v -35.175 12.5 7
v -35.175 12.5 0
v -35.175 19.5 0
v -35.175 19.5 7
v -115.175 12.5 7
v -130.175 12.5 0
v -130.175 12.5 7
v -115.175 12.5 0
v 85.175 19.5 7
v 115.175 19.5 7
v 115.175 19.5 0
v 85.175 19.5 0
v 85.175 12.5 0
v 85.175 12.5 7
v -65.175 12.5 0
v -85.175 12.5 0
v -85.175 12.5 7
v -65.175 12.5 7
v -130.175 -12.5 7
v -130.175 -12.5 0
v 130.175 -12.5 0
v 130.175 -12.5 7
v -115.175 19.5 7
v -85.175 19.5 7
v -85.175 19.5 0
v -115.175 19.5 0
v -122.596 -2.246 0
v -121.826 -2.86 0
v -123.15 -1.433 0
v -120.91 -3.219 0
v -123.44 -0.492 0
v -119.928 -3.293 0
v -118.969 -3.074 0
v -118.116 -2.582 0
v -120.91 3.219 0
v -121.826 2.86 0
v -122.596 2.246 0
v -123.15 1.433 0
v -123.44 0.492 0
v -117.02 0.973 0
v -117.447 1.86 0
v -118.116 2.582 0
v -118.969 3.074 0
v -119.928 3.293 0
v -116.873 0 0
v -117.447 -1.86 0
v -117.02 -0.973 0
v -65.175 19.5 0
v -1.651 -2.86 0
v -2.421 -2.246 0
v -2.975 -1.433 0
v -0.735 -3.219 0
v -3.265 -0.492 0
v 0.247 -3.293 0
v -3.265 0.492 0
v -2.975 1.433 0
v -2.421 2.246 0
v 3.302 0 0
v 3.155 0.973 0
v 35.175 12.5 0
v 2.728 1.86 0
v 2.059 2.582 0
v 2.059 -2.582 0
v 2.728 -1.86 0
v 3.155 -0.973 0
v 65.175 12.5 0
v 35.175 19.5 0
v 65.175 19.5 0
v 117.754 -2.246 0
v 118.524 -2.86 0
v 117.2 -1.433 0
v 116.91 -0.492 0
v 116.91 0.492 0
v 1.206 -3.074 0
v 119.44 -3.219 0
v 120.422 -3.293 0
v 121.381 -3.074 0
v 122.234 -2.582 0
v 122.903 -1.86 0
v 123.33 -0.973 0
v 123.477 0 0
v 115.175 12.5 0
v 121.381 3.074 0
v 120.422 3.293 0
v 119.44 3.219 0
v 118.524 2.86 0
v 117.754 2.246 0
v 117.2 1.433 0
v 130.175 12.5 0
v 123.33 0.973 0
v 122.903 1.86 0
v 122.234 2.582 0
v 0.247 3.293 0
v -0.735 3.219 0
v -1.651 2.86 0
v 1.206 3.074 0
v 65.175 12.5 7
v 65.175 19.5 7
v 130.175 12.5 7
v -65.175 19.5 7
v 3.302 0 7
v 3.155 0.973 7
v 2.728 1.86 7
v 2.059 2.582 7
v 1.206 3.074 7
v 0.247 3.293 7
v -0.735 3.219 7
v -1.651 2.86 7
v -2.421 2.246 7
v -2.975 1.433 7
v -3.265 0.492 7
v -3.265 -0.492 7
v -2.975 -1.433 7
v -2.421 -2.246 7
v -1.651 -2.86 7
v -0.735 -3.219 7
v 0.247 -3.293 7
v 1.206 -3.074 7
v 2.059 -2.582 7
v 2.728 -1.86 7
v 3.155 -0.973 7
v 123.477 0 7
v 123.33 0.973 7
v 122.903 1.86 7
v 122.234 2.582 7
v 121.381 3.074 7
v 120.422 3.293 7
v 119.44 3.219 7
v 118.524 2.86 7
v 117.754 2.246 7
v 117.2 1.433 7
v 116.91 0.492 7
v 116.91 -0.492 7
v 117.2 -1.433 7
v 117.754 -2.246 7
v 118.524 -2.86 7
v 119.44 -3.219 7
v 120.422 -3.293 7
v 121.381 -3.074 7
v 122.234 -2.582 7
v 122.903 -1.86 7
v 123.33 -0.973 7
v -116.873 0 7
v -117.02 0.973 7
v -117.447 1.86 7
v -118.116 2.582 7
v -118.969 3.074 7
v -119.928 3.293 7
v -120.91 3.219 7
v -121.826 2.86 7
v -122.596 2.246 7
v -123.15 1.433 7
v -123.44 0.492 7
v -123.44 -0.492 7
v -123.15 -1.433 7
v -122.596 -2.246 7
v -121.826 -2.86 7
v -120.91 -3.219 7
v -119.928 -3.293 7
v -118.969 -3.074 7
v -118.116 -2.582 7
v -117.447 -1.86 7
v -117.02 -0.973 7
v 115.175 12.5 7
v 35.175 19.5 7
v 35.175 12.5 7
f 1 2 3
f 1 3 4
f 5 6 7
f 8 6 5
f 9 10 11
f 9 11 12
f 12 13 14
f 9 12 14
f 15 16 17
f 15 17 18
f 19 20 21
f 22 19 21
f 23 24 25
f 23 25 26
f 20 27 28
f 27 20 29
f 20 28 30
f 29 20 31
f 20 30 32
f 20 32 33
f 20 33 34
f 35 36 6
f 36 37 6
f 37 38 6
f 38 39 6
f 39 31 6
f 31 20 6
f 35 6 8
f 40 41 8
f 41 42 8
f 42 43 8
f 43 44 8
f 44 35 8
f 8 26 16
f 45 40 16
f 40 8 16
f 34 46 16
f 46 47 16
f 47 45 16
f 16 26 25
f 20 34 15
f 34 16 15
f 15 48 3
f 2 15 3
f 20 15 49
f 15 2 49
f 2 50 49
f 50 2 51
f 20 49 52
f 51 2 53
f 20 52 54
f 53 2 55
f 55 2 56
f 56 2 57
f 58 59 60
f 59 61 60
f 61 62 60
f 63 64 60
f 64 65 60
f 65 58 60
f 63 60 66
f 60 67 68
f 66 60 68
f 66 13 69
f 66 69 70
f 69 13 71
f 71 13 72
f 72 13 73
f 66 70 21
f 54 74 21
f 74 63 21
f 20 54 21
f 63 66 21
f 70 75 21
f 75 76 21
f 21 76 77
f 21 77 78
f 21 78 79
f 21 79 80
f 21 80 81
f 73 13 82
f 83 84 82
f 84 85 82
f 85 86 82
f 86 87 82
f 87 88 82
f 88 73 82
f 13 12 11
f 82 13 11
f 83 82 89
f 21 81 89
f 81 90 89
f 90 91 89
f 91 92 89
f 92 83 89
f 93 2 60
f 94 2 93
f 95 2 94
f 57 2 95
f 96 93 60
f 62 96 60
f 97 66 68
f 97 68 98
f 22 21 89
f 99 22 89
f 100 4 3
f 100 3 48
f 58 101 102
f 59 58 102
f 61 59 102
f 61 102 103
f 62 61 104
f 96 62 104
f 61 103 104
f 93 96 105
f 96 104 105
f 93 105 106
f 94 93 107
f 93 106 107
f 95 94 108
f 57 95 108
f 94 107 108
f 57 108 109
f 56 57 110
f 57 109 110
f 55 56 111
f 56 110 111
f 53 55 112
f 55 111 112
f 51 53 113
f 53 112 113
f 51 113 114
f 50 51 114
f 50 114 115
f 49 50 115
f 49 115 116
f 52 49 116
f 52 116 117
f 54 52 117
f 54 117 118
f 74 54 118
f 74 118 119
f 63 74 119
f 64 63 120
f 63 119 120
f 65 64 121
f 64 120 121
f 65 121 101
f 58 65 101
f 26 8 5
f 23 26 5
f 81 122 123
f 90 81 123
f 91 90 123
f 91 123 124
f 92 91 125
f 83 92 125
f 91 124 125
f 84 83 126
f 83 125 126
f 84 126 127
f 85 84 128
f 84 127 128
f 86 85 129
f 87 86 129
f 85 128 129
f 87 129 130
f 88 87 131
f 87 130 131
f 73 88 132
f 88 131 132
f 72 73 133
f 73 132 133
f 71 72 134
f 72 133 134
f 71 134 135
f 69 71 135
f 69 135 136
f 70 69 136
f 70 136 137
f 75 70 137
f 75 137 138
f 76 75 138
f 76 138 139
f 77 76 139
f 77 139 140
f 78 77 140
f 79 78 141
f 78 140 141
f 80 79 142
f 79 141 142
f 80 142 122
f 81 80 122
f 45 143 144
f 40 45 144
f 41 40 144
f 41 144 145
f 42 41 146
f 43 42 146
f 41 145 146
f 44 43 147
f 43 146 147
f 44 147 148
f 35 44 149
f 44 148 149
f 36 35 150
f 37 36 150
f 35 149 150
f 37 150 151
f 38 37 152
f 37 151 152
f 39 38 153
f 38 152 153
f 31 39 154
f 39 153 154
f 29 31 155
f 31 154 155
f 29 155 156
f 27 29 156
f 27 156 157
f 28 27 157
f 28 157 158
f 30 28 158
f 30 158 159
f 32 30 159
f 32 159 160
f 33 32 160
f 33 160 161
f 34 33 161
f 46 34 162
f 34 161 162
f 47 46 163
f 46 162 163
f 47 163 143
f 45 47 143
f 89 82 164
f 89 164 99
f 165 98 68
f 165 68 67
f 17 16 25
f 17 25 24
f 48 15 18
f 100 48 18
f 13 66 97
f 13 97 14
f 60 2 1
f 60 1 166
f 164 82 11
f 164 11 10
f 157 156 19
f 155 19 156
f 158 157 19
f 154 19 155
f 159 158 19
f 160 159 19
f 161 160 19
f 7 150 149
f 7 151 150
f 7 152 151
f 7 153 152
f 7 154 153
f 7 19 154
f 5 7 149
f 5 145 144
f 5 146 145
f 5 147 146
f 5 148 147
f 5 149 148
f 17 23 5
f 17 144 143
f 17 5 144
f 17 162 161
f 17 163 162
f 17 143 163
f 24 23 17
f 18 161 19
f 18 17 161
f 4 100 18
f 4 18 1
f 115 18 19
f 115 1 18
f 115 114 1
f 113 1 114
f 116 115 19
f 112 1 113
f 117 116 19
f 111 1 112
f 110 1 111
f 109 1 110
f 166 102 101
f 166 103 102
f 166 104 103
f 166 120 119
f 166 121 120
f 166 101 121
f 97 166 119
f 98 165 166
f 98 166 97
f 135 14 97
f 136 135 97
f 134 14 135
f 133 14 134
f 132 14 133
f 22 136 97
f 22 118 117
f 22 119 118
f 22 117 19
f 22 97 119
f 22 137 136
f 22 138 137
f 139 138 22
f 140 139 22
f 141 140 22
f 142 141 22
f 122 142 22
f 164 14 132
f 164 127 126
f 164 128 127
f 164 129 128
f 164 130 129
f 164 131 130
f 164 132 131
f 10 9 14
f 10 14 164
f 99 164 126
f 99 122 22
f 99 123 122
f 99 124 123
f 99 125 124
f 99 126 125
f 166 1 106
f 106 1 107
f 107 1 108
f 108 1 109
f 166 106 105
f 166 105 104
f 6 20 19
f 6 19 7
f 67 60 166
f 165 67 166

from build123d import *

# Parameters (mm, degrees)
F0_W     = 260.35
F0_H     = 25
F1_DEPTH = 7
F2_R     = 3.302
F3_DEPTH = 7
F4_W     = 30
F4_H     = 7
F5_DEPTH = 7


with BuildPart() as f1:
    # F0 (on Top) → F1 (new body)
    with BuildSketch(Plane.XY):
        Rectangle(F0_W, F0_H)
    extrude(amount=F1_DEPTH)

    # F2 (on face) → F3 (cut, through all)
    with BuildSketch(Plane.XY.offset(7)):
        with Locations((-120.175, 0)):
            Circle(F2_R)
        Circle(F2_R)
        with Locations((120.175, 0)):
            Circle(F2_R)
    extrude(amount=-F3_DEPTH, mode=Mode.SUBTRACT)

    # F4 (on face) → F5 (join)
    with BuildSketch(Plane(origin=(0, 12.5, 0), x_dir=(-1, 0, 0), z_dir=(0, 1, 0))):
        with Locations((100.175, 3.5)):
            Rectangle(F4_W, F4_H)
        with Locations((50.175, 3.5)):
            Rectangle(F4_W, F4_H)
        with Locations((-50.175, 3.5)):
            Rectangle(F4_W, F4_H)
        with Locations((-100.175, 3.5)):
            Rectangle(F4_W, F4_H)
    extrude(amount=F5_DEPTH)


solid = f1.part
